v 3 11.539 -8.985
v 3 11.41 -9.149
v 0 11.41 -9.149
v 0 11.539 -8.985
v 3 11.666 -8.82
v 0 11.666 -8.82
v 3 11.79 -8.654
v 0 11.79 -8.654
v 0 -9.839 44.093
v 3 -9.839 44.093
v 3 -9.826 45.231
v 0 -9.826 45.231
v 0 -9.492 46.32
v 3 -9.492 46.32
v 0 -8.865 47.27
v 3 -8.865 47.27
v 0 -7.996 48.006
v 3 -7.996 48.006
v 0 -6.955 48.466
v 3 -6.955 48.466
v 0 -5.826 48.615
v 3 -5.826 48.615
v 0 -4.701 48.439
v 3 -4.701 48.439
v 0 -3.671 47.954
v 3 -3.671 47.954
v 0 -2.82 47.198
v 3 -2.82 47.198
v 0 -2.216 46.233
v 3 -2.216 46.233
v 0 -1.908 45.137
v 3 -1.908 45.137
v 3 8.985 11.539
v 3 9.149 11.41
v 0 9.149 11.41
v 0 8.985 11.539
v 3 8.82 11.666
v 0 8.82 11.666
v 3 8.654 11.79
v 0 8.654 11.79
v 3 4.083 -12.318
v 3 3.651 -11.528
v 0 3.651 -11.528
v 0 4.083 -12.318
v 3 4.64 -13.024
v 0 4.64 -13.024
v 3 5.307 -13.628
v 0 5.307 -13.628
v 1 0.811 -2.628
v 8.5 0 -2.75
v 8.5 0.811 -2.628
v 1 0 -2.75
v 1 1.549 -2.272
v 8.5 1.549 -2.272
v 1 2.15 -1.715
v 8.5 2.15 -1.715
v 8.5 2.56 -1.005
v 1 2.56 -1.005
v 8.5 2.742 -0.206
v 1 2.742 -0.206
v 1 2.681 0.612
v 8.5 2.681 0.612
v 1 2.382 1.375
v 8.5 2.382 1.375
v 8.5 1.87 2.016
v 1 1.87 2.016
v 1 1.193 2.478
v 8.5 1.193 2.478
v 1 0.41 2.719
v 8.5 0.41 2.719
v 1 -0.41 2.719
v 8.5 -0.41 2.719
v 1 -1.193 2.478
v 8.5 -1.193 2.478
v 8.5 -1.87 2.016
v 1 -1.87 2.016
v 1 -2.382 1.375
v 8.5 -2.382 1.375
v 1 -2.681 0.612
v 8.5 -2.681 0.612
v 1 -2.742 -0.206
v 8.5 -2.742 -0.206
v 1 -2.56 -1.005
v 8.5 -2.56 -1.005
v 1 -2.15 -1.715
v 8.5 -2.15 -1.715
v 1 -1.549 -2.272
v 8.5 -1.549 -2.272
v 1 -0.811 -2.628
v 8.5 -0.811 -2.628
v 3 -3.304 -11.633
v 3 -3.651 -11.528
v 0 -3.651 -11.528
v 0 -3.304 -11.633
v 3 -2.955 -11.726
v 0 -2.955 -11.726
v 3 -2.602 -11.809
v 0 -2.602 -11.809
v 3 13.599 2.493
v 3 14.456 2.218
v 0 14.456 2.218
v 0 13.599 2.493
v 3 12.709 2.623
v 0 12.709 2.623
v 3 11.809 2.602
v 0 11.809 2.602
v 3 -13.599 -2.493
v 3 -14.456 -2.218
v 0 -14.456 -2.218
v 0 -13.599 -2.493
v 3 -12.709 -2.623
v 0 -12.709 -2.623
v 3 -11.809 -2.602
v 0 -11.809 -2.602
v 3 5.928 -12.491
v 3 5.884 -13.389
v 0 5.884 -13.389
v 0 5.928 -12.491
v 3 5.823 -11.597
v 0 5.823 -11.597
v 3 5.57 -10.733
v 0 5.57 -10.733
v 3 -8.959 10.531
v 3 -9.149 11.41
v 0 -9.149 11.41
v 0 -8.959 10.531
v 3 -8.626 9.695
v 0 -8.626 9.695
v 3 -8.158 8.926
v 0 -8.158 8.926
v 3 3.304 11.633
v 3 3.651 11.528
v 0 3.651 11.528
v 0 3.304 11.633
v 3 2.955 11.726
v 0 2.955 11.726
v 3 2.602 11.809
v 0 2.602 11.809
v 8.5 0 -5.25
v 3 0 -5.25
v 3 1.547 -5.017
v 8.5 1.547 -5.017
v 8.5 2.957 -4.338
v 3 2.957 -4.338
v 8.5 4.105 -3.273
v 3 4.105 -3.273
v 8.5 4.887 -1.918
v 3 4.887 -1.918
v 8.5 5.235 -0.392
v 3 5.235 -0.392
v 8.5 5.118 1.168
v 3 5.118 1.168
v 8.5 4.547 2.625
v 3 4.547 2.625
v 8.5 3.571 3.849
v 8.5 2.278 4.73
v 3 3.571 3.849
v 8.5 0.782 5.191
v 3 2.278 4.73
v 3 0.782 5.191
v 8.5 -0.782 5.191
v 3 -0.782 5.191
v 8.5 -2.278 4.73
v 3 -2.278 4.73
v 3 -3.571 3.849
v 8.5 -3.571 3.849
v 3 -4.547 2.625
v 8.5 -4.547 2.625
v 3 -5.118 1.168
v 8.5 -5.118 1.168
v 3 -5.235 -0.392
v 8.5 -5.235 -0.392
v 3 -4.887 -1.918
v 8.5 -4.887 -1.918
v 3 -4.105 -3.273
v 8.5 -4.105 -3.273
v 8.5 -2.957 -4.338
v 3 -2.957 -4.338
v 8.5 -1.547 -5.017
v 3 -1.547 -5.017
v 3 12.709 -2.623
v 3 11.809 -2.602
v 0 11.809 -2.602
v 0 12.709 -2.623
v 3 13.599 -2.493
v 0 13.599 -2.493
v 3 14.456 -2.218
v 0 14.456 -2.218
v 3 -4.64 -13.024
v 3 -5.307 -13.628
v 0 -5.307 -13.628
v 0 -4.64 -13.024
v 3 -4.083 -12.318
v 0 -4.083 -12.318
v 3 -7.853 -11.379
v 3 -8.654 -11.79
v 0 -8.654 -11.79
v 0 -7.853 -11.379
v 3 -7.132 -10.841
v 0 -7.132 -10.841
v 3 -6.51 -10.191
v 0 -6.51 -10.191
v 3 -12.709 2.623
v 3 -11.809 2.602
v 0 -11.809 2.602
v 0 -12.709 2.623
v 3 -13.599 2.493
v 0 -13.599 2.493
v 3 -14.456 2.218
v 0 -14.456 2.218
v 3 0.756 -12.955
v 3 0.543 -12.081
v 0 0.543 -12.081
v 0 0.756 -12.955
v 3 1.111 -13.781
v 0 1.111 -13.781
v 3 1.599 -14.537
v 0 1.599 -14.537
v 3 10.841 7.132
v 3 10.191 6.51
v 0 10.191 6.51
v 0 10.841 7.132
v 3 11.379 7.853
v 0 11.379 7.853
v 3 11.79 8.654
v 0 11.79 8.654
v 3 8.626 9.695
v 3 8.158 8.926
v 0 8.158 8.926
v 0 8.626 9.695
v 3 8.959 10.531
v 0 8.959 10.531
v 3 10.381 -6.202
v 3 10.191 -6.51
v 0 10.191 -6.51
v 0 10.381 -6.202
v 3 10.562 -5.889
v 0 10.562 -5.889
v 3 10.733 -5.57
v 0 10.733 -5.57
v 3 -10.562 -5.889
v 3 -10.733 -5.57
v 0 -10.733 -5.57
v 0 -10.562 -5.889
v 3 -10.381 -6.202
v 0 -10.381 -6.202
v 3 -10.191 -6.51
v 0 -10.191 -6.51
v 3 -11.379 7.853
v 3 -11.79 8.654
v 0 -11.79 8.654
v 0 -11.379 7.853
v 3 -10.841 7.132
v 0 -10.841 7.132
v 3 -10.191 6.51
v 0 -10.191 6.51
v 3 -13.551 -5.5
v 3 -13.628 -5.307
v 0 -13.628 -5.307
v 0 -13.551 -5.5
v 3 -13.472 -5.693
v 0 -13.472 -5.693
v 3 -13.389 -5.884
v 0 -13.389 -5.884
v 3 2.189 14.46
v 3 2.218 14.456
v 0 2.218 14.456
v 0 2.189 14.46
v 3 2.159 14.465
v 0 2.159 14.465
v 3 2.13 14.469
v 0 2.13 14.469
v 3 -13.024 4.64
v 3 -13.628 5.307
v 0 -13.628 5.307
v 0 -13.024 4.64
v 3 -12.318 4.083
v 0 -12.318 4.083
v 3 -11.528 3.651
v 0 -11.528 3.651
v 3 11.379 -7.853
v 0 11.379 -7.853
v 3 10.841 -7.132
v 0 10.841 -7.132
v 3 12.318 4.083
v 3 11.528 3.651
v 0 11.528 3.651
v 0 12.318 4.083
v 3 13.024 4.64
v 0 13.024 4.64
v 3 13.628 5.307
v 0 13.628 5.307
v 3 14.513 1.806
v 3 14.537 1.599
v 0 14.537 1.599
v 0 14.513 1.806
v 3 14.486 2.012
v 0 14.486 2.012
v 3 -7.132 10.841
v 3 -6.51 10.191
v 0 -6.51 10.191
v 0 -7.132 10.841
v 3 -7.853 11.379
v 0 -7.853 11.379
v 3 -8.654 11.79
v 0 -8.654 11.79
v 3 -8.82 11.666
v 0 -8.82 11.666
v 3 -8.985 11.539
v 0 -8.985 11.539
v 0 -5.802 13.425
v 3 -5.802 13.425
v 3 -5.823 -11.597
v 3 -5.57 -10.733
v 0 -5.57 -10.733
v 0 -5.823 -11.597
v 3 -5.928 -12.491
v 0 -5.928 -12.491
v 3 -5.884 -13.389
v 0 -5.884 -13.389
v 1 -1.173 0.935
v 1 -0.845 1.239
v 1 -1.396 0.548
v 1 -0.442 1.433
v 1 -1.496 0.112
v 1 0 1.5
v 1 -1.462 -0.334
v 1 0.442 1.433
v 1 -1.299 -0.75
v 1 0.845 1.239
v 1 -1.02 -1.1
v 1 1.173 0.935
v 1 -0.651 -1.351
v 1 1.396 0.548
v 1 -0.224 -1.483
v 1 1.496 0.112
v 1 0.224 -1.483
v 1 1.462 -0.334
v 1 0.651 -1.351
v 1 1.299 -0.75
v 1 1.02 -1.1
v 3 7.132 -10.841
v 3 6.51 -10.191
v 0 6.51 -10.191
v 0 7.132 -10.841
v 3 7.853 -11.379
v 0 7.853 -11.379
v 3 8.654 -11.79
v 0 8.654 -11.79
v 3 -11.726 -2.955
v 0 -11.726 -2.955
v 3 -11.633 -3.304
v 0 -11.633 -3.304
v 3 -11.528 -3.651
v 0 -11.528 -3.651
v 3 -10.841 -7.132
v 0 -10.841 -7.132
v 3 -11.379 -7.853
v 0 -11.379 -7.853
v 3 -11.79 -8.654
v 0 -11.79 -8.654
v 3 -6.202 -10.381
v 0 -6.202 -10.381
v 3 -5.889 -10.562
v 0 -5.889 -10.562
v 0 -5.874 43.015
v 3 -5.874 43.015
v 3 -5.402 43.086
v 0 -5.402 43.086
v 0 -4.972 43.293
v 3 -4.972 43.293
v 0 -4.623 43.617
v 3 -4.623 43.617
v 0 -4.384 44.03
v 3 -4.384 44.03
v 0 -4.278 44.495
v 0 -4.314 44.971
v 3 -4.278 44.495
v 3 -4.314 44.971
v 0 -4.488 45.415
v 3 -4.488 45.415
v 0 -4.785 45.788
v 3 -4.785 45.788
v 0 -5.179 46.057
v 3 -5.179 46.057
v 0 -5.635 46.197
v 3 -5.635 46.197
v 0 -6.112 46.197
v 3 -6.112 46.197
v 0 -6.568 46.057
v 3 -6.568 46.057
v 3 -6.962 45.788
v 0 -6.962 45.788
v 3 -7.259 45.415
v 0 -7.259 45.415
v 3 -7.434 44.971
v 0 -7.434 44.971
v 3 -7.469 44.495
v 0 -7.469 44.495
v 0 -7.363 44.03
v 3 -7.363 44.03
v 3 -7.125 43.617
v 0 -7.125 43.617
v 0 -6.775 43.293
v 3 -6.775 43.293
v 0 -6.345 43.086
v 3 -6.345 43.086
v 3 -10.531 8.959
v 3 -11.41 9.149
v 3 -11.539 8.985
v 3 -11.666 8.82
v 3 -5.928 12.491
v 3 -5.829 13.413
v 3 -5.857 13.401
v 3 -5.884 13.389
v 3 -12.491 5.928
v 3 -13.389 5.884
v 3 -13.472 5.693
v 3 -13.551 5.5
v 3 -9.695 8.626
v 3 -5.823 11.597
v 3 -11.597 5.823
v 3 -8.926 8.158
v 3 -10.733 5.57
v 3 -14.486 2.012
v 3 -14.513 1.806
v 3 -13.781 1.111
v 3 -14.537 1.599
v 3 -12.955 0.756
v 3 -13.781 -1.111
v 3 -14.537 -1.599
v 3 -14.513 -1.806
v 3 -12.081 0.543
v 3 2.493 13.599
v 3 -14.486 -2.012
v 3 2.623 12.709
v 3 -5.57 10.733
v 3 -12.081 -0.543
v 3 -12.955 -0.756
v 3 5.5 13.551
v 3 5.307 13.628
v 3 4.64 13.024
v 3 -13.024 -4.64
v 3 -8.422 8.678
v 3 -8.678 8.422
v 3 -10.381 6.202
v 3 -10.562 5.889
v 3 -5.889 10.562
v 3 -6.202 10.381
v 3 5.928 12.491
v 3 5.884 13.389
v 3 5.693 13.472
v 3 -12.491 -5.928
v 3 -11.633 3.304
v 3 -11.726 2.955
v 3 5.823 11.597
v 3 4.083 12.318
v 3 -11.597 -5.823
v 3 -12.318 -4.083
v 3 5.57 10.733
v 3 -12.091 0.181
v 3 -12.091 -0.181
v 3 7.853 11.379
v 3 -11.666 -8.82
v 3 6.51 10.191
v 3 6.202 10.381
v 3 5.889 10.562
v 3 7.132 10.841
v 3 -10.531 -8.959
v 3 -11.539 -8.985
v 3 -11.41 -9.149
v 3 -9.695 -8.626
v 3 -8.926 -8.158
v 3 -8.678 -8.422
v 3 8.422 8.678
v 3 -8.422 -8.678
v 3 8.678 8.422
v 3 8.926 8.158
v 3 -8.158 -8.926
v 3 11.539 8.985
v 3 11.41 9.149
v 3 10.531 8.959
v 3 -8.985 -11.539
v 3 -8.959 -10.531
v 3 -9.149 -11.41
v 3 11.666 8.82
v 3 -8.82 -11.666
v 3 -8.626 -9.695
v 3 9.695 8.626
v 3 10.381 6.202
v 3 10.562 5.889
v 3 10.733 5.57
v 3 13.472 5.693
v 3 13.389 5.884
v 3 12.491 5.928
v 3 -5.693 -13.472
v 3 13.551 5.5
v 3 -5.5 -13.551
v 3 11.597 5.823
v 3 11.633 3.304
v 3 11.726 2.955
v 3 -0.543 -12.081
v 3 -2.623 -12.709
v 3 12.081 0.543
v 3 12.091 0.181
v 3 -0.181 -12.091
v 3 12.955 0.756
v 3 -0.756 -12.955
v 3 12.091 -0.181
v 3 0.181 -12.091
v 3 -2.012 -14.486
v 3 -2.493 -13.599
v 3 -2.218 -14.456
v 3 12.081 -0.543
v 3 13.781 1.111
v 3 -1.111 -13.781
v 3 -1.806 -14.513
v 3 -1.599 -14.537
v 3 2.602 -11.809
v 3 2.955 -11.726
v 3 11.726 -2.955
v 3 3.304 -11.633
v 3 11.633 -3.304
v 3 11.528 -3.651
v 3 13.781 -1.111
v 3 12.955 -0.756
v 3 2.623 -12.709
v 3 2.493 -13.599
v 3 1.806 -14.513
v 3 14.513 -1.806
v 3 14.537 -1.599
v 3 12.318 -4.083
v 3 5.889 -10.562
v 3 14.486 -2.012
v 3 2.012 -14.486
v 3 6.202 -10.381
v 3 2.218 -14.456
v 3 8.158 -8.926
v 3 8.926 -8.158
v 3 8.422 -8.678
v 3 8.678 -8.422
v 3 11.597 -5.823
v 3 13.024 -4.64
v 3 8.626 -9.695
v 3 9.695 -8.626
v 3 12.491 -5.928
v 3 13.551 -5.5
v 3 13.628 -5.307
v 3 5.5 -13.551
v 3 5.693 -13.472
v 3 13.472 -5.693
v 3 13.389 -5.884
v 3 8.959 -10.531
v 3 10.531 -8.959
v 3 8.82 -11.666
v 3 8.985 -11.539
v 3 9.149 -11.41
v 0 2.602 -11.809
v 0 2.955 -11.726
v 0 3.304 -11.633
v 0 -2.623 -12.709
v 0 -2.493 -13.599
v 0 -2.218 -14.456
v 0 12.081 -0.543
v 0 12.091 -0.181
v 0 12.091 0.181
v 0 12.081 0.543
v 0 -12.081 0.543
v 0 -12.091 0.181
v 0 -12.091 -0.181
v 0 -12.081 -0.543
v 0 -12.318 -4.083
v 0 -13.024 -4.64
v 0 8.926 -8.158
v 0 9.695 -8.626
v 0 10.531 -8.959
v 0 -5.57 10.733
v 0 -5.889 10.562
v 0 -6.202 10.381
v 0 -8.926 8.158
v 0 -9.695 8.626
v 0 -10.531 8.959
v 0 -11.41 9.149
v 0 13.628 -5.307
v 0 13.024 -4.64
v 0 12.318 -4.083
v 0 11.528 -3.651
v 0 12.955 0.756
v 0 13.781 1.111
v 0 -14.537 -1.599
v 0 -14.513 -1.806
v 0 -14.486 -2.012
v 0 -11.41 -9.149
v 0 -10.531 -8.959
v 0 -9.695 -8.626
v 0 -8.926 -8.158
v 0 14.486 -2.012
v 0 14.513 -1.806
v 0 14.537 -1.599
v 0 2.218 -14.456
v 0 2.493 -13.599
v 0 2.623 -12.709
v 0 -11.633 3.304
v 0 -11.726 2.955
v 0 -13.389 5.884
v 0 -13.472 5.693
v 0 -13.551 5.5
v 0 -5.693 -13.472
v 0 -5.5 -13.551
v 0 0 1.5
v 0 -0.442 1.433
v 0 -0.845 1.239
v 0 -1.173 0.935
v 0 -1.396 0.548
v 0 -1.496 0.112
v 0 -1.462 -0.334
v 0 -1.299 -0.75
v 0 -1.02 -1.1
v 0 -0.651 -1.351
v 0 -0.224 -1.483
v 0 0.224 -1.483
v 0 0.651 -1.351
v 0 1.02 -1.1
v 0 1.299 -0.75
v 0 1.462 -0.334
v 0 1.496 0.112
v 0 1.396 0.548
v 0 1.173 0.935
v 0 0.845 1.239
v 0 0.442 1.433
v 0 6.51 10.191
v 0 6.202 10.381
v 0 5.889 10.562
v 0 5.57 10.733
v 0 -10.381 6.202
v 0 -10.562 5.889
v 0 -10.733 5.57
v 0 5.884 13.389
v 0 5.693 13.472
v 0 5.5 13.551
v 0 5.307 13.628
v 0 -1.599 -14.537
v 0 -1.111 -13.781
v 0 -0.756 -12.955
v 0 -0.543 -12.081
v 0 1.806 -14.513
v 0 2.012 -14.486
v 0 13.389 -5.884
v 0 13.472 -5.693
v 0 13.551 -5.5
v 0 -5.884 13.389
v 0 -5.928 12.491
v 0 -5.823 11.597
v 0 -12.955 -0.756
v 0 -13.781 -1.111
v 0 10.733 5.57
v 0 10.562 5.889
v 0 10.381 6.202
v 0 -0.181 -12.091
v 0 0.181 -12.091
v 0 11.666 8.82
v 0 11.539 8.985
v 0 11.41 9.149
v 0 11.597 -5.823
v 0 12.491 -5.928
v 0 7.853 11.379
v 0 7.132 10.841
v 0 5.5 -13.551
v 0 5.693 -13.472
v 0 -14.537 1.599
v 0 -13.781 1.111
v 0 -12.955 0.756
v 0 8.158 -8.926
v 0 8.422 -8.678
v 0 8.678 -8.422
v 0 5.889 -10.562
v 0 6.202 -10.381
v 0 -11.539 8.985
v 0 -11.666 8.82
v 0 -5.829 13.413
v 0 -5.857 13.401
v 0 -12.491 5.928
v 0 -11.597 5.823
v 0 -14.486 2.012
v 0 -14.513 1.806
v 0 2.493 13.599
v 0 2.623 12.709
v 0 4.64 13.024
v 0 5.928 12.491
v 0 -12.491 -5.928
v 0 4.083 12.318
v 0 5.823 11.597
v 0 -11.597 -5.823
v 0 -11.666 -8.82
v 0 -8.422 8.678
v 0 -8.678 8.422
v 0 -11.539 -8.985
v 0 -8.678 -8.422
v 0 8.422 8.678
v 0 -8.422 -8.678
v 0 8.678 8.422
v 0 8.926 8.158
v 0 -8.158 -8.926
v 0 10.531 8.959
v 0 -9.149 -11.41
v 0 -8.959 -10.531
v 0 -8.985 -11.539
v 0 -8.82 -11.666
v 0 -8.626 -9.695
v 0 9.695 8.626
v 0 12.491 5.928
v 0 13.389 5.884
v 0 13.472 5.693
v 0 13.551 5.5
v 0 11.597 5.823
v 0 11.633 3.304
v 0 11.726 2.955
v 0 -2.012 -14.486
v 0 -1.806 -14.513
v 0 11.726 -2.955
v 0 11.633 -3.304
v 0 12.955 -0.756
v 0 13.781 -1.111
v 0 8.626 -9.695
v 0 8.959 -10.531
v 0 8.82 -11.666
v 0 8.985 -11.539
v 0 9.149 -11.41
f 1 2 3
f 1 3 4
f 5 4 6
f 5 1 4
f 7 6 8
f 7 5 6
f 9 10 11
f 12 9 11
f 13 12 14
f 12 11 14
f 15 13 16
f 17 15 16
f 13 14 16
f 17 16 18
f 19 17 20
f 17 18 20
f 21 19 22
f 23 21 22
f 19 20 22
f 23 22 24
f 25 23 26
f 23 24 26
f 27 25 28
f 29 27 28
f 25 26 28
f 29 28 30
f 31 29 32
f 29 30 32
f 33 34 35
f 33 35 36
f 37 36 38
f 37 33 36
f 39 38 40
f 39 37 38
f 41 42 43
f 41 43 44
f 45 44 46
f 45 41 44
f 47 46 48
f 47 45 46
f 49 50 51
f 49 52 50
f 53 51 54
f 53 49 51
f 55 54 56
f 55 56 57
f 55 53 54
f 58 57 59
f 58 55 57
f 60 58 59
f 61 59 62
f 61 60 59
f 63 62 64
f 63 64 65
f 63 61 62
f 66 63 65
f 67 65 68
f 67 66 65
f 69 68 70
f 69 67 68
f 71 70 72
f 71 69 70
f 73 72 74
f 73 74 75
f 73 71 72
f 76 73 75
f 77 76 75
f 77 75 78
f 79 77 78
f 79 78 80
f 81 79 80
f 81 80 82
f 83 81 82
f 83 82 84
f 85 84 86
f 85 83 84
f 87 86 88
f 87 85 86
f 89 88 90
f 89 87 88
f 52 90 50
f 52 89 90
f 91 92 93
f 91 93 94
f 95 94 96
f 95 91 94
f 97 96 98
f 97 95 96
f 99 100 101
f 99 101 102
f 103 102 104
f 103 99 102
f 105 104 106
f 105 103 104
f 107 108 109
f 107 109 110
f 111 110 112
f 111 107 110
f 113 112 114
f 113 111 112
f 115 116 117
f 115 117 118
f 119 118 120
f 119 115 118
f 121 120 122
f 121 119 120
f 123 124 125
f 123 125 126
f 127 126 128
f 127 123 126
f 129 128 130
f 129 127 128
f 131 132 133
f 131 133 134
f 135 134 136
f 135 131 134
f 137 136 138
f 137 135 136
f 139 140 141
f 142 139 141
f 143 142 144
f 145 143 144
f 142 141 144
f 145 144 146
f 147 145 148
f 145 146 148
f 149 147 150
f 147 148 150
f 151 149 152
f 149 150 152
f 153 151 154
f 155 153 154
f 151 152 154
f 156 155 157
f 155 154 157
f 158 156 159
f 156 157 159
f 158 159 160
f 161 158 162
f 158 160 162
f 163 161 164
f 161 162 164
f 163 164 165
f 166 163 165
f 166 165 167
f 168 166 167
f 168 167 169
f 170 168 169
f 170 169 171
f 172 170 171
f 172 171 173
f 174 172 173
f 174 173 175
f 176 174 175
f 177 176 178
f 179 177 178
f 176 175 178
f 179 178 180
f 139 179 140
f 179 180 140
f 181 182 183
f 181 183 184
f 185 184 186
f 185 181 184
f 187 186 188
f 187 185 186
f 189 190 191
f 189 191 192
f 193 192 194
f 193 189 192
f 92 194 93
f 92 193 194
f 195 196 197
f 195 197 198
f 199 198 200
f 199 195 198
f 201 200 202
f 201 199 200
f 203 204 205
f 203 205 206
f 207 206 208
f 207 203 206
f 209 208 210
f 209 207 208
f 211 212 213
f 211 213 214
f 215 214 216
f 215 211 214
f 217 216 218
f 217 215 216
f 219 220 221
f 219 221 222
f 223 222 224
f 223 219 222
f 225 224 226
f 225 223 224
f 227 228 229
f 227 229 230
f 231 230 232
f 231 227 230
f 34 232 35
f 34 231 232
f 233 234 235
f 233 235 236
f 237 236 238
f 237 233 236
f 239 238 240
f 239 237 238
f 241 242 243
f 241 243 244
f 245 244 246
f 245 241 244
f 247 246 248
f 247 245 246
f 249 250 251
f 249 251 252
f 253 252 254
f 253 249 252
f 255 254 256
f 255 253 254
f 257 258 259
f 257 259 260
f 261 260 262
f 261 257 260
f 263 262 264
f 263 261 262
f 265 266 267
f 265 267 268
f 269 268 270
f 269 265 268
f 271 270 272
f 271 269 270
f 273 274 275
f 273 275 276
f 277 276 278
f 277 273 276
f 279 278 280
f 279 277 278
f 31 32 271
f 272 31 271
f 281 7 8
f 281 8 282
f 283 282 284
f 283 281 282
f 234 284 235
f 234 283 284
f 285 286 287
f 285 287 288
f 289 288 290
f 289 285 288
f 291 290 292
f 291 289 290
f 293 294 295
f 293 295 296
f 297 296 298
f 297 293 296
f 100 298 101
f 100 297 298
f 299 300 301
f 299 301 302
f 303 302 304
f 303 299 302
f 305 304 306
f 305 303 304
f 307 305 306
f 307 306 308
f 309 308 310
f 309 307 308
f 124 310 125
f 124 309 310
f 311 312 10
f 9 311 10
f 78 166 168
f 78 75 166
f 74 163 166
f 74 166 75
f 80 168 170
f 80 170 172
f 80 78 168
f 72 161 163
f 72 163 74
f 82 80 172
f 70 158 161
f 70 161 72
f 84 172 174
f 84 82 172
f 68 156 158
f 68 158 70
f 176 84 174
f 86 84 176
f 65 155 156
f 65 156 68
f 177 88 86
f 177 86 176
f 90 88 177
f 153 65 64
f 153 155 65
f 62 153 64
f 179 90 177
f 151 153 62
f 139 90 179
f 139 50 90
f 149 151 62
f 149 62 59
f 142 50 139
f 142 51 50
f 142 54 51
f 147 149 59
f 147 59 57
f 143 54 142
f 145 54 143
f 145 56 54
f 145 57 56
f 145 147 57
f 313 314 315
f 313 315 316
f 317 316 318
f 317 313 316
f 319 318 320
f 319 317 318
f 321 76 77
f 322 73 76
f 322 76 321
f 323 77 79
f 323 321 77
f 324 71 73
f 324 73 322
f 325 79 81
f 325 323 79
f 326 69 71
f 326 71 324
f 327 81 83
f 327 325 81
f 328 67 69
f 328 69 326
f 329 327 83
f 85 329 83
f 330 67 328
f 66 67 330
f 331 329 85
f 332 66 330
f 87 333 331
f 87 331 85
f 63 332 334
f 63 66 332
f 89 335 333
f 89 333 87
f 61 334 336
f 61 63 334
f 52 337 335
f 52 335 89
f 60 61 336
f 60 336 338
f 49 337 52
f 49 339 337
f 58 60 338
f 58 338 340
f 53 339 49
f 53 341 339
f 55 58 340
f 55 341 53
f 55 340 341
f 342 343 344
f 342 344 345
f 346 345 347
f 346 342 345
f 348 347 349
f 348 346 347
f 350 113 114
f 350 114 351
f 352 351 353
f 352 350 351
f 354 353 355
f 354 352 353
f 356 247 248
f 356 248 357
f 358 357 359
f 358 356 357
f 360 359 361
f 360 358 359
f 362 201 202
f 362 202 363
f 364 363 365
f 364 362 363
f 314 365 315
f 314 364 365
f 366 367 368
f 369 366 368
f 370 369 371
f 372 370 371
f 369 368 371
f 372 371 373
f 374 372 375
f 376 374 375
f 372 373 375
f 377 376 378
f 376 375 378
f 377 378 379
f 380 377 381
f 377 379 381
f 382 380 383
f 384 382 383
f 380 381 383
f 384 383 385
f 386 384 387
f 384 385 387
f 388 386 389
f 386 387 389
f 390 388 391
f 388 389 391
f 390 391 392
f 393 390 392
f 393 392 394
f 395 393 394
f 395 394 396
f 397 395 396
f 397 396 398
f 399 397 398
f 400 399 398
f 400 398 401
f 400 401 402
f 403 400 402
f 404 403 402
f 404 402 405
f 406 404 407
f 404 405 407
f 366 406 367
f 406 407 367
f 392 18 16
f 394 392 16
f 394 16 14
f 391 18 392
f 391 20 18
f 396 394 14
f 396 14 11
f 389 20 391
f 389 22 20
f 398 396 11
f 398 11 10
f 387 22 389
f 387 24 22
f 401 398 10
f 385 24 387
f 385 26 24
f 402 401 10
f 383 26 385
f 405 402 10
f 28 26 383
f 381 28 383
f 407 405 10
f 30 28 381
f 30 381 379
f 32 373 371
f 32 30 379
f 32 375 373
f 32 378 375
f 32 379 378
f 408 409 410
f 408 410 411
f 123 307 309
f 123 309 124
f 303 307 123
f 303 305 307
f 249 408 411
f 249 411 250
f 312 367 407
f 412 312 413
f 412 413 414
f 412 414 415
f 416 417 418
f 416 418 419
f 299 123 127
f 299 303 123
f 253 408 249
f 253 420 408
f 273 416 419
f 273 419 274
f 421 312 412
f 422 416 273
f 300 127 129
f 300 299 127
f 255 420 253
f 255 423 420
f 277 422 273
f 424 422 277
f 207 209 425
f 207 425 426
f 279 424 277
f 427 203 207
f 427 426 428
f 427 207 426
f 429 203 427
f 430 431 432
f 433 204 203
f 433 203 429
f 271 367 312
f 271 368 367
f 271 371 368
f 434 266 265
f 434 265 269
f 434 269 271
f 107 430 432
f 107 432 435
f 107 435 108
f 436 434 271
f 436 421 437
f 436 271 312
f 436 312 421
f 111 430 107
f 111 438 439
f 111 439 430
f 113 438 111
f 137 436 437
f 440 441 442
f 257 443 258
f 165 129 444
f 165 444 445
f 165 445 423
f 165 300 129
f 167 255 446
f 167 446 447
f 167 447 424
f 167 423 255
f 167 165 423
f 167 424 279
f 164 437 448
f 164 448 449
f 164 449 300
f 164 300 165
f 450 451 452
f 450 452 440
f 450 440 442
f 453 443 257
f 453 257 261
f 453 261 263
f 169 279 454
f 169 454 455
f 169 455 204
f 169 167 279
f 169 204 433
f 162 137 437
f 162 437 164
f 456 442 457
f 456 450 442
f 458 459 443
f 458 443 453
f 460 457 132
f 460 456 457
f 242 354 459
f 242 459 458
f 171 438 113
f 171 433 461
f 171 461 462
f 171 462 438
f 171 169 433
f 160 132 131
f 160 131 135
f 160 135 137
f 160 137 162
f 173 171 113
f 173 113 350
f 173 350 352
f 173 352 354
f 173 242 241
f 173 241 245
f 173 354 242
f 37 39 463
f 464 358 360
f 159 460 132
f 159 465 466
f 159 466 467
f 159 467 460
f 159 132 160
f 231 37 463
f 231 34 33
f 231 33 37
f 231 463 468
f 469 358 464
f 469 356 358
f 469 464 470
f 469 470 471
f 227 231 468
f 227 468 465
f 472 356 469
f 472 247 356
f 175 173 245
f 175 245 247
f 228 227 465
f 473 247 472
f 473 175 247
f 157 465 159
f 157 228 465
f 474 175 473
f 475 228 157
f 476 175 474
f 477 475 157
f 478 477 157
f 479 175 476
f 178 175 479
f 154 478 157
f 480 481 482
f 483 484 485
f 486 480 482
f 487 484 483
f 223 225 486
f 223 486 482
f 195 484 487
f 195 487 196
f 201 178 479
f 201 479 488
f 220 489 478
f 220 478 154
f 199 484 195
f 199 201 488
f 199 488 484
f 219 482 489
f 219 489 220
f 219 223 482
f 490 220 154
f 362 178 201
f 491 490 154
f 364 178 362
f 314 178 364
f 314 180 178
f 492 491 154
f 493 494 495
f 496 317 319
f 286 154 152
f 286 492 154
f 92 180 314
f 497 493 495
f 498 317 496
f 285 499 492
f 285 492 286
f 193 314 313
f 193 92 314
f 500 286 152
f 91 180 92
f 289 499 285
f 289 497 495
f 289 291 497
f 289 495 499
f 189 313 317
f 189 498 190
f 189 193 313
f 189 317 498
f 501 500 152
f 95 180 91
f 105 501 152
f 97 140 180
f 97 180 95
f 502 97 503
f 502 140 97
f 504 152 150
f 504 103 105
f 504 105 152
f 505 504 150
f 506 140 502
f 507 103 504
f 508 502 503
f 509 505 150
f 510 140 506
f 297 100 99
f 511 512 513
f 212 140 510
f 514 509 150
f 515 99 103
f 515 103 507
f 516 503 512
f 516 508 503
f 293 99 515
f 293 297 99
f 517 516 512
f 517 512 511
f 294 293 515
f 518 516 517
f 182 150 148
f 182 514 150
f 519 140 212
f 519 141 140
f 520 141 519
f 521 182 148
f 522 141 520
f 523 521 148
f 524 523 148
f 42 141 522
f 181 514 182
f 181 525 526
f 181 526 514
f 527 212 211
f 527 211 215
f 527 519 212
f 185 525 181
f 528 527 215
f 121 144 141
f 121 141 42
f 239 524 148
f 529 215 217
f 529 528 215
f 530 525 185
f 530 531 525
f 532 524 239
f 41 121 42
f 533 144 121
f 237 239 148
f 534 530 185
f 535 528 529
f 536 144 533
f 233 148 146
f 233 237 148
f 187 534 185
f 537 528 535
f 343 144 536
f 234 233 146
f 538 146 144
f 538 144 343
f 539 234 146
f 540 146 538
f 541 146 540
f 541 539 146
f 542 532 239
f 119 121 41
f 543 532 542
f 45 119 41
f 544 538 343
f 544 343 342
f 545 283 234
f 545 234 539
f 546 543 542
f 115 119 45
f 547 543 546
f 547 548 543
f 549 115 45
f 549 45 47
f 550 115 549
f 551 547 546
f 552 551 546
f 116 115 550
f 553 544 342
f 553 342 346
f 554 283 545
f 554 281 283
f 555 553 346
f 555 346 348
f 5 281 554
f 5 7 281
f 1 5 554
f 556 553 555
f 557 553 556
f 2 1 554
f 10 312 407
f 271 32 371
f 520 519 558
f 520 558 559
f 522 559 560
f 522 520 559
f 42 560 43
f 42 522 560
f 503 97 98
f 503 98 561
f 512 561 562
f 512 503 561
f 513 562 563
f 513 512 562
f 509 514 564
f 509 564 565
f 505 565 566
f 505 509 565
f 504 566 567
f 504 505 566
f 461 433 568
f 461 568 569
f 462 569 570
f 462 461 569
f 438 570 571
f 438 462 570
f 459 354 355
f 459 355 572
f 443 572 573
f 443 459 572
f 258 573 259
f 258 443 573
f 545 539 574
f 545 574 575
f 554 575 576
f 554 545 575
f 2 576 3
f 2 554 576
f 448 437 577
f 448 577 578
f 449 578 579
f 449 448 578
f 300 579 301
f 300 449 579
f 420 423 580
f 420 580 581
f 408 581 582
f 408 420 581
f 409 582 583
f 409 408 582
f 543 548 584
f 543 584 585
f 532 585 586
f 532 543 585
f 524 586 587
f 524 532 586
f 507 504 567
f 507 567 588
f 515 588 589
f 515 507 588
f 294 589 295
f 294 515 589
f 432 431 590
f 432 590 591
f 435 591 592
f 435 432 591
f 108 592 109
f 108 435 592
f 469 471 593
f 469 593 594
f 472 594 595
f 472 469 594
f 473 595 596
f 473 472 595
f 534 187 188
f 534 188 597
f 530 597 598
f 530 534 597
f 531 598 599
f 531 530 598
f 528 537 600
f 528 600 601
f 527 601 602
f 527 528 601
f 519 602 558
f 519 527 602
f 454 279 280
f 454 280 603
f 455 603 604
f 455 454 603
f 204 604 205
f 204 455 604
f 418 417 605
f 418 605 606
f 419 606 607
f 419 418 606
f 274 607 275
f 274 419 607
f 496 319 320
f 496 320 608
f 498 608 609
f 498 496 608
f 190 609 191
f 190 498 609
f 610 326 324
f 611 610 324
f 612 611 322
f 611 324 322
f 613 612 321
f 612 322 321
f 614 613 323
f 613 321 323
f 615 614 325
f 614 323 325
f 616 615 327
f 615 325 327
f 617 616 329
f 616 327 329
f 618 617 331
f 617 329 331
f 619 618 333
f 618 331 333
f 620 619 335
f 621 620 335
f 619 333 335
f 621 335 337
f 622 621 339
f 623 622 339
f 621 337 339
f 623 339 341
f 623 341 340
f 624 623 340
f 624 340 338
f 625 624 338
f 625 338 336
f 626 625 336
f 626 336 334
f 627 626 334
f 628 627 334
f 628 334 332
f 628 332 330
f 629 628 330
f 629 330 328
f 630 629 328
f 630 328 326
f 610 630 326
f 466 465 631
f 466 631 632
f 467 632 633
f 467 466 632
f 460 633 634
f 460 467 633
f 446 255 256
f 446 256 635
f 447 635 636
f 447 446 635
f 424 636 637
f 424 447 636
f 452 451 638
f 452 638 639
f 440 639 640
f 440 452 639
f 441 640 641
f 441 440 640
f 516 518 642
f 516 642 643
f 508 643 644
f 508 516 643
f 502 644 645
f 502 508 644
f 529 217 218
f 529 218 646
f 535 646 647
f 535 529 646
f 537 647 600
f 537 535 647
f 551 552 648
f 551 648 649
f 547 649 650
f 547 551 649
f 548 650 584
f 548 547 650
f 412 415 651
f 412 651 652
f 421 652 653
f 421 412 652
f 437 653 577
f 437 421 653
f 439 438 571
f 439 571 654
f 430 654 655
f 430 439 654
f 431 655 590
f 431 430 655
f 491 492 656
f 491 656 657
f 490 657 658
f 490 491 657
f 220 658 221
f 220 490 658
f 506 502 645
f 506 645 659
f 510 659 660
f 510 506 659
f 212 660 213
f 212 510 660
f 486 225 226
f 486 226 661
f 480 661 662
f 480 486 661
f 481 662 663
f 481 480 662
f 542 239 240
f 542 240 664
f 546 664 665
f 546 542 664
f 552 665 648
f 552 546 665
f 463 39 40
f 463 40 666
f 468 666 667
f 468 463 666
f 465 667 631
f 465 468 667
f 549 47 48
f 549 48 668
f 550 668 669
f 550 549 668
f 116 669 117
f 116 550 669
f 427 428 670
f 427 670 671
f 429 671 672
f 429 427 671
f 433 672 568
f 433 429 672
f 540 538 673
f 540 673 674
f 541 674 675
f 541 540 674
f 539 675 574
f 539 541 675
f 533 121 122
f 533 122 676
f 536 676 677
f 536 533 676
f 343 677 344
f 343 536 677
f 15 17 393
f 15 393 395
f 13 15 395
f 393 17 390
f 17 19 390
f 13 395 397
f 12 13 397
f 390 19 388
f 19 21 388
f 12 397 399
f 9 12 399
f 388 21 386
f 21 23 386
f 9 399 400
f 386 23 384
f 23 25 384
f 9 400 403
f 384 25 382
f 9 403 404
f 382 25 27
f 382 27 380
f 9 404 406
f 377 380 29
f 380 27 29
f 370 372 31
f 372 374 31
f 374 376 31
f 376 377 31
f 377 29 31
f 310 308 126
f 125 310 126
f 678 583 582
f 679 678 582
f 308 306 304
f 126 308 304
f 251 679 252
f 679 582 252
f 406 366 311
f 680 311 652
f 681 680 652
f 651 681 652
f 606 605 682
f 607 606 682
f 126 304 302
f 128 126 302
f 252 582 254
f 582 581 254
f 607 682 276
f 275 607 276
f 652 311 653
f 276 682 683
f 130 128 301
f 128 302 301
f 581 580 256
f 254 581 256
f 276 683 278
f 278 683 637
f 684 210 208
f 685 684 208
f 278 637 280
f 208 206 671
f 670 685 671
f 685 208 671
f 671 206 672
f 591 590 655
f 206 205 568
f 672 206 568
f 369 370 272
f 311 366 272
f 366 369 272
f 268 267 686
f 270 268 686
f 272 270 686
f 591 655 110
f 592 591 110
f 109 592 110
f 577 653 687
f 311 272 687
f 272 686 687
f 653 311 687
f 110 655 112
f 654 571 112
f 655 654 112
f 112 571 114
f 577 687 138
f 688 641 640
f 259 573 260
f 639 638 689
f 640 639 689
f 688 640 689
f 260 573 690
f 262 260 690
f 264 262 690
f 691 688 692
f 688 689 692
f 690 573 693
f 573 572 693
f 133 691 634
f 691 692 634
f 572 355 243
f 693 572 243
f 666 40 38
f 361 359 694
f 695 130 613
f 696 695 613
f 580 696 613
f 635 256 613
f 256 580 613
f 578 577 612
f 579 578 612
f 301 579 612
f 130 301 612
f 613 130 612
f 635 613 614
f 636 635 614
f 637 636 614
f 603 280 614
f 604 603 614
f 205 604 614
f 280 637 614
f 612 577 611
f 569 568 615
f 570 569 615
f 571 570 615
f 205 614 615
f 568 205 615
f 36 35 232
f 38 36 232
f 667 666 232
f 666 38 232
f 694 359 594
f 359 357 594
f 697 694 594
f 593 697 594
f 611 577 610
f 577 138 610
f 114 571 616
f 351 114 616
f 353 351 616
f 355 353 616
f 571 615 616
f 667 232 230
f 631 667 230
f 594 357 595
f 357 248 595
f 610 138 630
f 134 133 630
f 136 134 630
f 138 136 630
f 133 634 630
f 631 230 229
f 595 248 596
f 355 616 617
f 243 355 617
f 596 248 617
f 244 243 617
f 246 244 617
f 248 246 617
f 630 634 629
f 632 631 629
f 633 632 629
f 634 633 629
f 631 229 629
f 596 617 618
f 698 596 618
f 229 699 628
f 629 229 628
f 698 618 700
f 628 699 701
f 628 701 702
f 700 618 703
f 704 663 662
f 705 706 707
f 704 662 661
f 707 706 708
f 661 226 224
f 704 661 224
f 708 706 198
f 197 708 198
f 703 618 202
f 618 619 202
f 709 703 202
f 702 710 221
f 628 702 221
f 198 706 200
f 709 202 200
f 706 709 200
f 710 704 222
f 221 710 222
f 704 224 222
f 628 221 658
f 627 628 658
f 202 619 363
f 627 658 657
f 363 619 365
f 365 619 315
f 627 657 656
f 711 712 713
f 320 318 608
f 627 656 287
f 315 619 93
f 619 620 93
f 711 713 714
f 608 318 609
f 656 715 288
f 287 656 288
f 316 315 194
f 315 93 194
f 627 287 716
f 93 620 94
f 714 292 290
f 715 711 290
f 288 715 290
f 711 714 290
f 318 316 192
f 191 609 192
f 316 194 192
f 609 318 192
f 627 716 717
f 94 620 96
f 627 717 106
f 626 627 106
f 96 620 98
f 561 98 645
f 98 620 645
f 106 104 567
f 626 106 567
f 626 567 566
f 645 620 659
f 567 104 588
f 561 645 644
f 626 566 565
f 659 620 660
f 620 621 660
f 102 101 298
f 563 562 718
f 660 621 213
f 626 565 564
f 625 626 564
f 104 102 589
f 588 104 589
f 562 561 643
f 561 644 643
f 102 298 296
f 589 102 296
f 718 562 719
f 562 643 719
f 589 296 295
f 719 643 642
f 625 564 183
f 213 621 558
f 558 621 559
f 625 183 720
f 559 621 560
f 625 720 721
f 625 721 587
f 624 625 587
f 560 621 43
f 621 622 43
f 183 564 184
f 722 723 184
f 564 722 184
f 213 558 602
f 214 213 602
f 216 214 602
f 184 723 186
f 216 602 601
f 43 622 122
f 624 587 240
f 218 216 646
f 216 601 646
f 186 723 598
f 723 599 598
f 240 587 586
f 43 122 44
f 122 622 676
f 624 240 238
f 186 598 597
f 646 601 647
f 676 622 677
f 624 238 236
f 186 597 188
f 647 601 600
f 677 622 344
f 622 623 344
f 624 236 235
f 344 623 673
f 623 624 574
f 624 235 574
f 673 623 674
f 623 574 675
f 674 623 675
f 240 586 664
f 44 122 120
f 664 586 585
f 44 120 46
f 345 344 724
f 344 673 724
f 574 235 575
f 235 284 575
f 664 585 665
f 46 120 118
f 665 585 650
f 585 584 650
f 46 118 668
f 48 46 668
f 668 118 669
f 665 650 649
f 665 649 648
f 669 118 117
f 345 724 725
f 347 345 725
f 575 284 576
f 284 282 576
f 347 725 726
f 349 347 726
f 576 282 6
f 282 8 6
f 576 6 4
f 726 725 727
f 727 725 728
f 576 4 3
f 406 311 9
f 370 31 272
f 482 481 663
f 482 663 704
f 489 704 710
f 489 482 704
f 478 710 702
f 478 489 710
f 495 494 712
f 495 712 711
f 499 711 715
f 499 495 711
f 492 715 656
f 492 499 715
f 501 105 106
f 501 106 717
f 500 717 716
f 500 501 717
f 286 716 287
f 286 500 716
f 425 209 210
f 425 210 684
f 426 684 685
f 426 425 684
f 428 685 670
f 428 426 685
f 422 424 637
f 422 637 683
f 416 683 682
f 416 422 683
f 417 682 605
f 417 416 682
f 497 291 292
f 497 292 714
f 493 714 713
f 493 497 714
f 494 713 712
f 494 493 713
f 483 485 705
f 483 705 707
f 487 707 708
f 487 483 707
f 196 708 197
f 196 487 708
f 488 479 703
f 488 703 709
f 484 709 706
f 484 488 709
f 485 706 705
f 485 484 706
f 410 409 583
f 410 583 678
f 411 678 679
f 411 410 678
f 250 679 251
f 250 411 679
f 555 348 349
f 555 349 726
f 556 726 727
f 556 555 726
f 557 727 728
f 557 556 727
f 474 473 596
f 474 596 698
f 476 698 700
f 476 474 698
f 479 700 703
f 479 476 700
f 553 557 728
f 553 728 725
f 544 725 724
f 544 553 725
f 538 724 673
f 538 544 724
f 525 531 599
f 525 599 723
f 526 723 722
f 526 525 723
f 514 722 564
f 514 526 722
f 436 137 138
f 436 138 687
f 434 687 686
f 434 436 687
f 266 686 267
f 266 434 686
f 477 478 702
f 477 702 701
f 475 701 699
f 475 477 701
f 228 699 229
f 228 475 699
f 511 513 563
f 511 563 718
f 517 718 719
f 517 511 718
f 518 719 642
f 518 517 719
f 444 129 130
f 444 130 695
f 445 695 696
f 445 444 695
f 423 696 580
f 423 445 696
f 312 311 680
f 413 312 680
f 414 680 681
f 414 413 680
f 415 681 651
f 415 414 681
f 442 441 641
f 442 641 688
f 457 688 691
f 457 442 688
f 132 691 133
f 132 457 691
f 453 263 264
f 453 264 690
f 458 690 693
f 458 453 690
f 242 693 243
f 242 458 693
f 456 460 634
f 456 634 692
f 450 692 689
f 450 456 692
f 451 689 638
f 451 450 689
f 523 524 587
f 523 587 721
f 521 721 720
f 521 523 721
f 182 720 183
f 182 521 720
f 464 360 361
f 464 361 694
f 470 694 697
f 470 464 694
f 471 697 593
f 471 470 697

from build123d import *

# Parameters (mm, degrees)
SKETCH1_R           = 1.5
BOSS_EXTRUDE1_DEPTH = 3
SKETCH2_R           = 1.6
SKETCH2_R_2         = 1.5
BOSS_EXTRUDE2_DEPTH = 3
SKETCH3_R           = 5.25
SKETCH3_R_2         = 2.75
BOSS_EXTRUDE3_DEPTH = 5.5
CUT_EXTRUDE1_START  = -2
SKETCH4_R           = 2.75
CUT_EXTRUDE1_DEPTH  = 2


with BuildPart() as part:
    # Sketch1 → Boss-Extrude1 (new body)
    with BuildSketch(Plane(origin=(3, 0, 0), x_dir=(0, 0, -1), z_dir=(1, 0, 0))):
        with BuildLine():
            ThreePointArc((-14.537314892, 1.599093719), (-13.375367565, 0.916420874), (-12.080565177, 0.542722358))
            ThreePointArc((-12.080565177, 0.542722358), (-12.09275, 0), (-12.080565177, -0.542722358))
            ThreePointArc((-12.080565177, -0.542722358), (-13.375367565, -0.916420874), (-14.537314892, -1.599093719))
            ThreePointArc((-14.537314892, -1.599093719), (-14.499881098, -1.908945561), (-14.455843809, -2.217928037))
            ThreePointArc((-14.455843809, -2.217928037), (-13.156800143, -2.576605271), (-11.809396783, -2.602450802))
            ThreePointArc((-11.809396783, -2.602450802), (-11.680699536, -3.129834008), (-11.528463019, -3.650909885))
            ThreePointArc((-11.528463019, -3.650909885), (-12.682425791, -4.346994451), (-13.62809199, -5.30713988))
            ThreePointArc((-13.62809199, -5.30713988), (-13.511738163, -5.596745198), (-13.389230859, -5.883801663))
            ThreePointArc((-13.389230859, -5.883801663), (-12.041618533, -5.894040025), (-10.733437515, -5.57027124))
            ThreePointArc((-10.733437515, -5.57027124), (-10.472628702, -6.046375), (-10.190715157, -6.510293938))
            ThreePointArc((-10.190715157, -6.510293938), (-11.125197659, -7.48132754), (-11.79013714, -8.65351323))
            ThreePointArc((-11.79013714, -8.65351323), (-11.602792602, -8.903135899), (-11.410163953, -9.148703928))
            ThreePointArc((-11.410163953, -9.148703928), (-10.105820521, -8.809805691), (-8.926012217, -8.158486898))
            ThreePointArc((-8.926012217, -8.158486898), (-8.550865528, -8.550865528), (-8.158486898, -8.926012217))
            ThreePointArc((-8.158486898, -8.926012217), (-8.809805691, -10.105820521), (-9.148703928, -11.410163953))
            ThreePointArc((-9.148703928, -11.410163953), (-8.903135899, -11.602792602), (-8.65351323, -11.79013714))
            ThreePointArc((-8.65351323, -11.79013714), (-7.48132754, -11.125197659), (-6.510293938, -10.190715157))
            ThreePointArc((-6.510293938, -10.190715157), (-6.046375, -10.472628702), (-5.57027124, -10.733437515))
            ThreePointArc((-5.57027124, -10.733437515), (-5.894040025, -12.041618533), (-5.883801663, -13.389230859))
            ThreePointArc((-5.883801663, -13.389230859), (-5.596745198, -13.511738163), (-5.30713988, -13.62809199))
            ThreePointArc((-5.30713988, -13.62809199), (-4.346994451, -12.682425791), (-3.650909885, -11.528463019))
            ThreePointArc((-3.650909885, -11.528463019), (-3.129834008, -11.680699536), (-2.602450802, -11.809396783))
            ThreePointArc((-2.602450802, -11.809396783), (-2.576605271, -13.156800143), (-2.217928037, -14.455843809))
            ThreePointArc((-2.217928037, -14.455843809), (-1.908945561, -14.499881098), (-1.599093719, -14.537314892))
            ThreePointArc((-1.599093719, -14.537314892), (-0.916420874, -13.375367565), (-0.542722358, -12.080565177))
            ThreePointArc((-0.542722358, -12.080565177), (0, -12.09275), (0.542722358, -12.080565177))
            ThreePointArc((0.542722358, -12.080565177), (0.916420874, -13.375367565), (1.599093719, -14.537314892))
            ThreePointArc((1.599093719, -14.537314892), (1.908945561, -14.499881098), (2.217928037, -14.455843809))
            ThreePointArc((2.217928037, -14.455843809), (2.576605271, -13.156800143), (2.602450802, -11.809396783))
            ThreePointArc((2.602450802, -11.809396783), (3.129834008, -11.680699536), (3.650909885, -11.528463019))
            ThreePointArc((3.650909885, -11.528463019), (4.346994451, -12.682425791), (5.30713988, -13.62809199))
            ThreePointArc((5.30713988, -13.62809199), (5.596745198, -13.511738163), (5.883801663, -13.389230859))
            ThreePointArc((5.883801663, -13.389230859), (5.894040025, -12.041618533), (5.57027124, -10.733437515))
            ThreePointArc((5.57027124, -10.733437515), (6.046375, -10.472628702), (6.510293938, -10.190715157))
            ThreePointArc((6.510293938, -10.190715157), (7.48132754, -11.125197659), (8.65351323, -11.79013714))
            ThreePointArc((8.65351323, -11.79013714), (8.903135899, -11.602792602), (9.148703928, -11.410163953))
            ThreePointArc((9.148703928, -11.410163953), (8.809805691, -10.105820521), (8.158486898, -8.926012217))
            ThreePointArc((8.158486898, -8.926012217), (8.550865528, -8.550865528), (8.926012217, -8.158486898))
            ThreePointArc((8.926012217, -8.158486898), (10.105820521, -8.809805691), (11.410163953, -9.148703928))
            ThreePointArc((11.410163953, -9.148703928), (11.602792602, -8.903135899), (11.79013714, -8.65351323))
            ThreePointArc((11.79013714, -8.65351323), (11.125197659, -7.48132754), (10.190715157, -6.510293938))
            ThreePointArc((10.190715157, -6.510293938), (10.472628702, -6.046375), (10.733437515, -5.57027124))
            ThreePointArc((10.733437515, -5.57027124), (12.041618533, -5.894040025), (13.389230859, -5.883801663))
            ThreePointArc((13.389230859, -5.883801663), (13.511738163, -5.596745198), (13.62809199, -5.30713988))
            ThreePointArc((13.62809199, -5.30713988), (12.682425791, -4.346994451), (11.528463019, -3.650909885))
            ThreePointArc((11.528463019, -3.650909885), (11.680699536, -3.129834008), (11.809396783, -2.602450802))
            ThreePointArc((11.809396783, -2.602450802), (13.156800143, -2.576605271), (14.455843809, -2.217928037))
            ThreePointArc((14.455843809, -2.217928037), (14.499881098, -1.908945561), (14.537314892, -1.599093719))
            ThreePointArc((14.537314892, -1.599093719), (13.375367565, -0.916420874), (12.080565177, -0.542722358))
            ThreePointArc((12.080565177, -0.542722358), (12.09275, 0), (12.080565177, 0.542722358))
            ThreePointArc((12.080565177, 0.542722358), (13.375367565, 0.916420874), (14.537314892, 1.599093719))
            ThreePointArc((14.537314892, 1.599093719), (14.499881098, 1.908945561), (14.455843809, 2.217928037))
            ThreePointArc((14.455843809, 2.217928037), (13.156800143, 2.576605271), (11.809396783, 2.602450802))
            ThreePointArc((11.809396783, 2.602450802), (11.680699536, 3.129834008), (11.528463019, 3.650909885))
            ThreePointArc((11.528463019, 3.650909885), (12.682425791, 4.346994451), (13.62809199, 5.30713988))
            ThreePointArc((13.62809199, 5.30713988), (13.511738163, 5.596745198), (13.389230859, 5.883801663))
            ThreePointArc((13.389230859, 5.883801663), (12.041618533, 5.894040025), (10.733437515, 5.57027124))
            ThreePointArc((10.733437515, 5.57027124), (10.472628702, 6.046375), (10.190715157, 6.510293938))
            ThreePointArc((10.190715157, 6.510293938), (11.125197659, 7.48132754), (11.79013714, 8.65351323))
            ThreePointArc((11.79013714, 8.65351323), (11.602792602, 8.903135899), (11.410163953, 9.148703928))
            ThreePointArc((11.410163953, 9.148703928), (10.105820521, 8.809805691), (8.926012217, 8.158486898))
            ThreePointArc((8.926012217, 8.158486898), (8.550865528, 8.550865528), (8.158486898, 8.926012217))
            ThreePointArc((8.158486898, 8.926012217), (8.809805691, 10.105820521), (9.148703928, 11.410163953))
            ThreePointArc((9.148703928, 11.410163953), (8.903135899, 11.602792602), (8.65351323, 11.79013714))
            ThreePointArc((8.65351323, 11.79013714), (7.48132754, 11.125197659), (6.510293938, 10.190715157))
            ThreePointArc((6.510293938, 10.190715157), (6.046375, 10.472628702), (5.57027124, 10.733437515))
            ThreePointArc((5.57027124, 10.733437515), (5.894040025, 12.041618533), (5.883801663, 13.389230859))
            ThreePointArc((5.883801663, 13.389230859), (5.596745198, 13.511738163), (5.30713988, 13.62809199))
            ThreePointArc((5.30713988, 13.62809199), (4.346994451, 12.682425791), (3.650909885, 11.528463019))
            ThreePointArc((3.650909885, 11.528463019), (3.129834008, 11.680699536), (2.602450802, 11.809396783))
            ThreePointArc((2.602450802, 11.809396783), (2.576605271, 13.156800143), (2.217928037, 14.455843809))
            ThreePointArc((2.217928037, 14.455843809), (1.908945561, 14.499881098), (1.599093719, 14.537314892))
            ThreePointArc((1.599093719, 14.537314892), (0.916420874, 13.375367565), (0.542722358, 12.080565177))
            ThreePointArc((0.542722358, 12.080565177), (0, 12.09275), (-0.542722358, 12.080565177))
            ThreePointArc((-0.542722358, 12.080565177), (-0.916420874, 13.375367565), (-1.599093719, 14.537314892))
            ThreePointArc((-1.599093719, 14.537314892), (-1.908945561, 14.499881098), (-2.217928037, 14.455843809))
            ThreePointArc((-2.217928037, 14.455843809), (-2.576605271, 13.156800143), (-2.602450802, 11.809396783))
            ThreePointArc((-2.602450802, 11.809396783), (-3.129834008, 11.680699536), (-3.650909885, 11.528463019))
            ThreePointArc((-3.650909885, 11.528463019), (-4.346994451, 12.682425791), (-5.30713988, 13.62809199))
            ThreePointArc((-5.30713988, 13.62809199), (-5.596745198, 13.511738163), (-5.883801663, 13.389230859))
            ThreePointArc((-5.883801663, 13.389230859), (-5.894040025, 12.041618533), (-5.57027124, 10.733437515))
            ThreePointArc((-5.57027124, 10.733437515), (-6.046375, 10.472628702), (-6.510293938, 10.190715157))
            ThreePointArc((-6.510293938, 10.190715157), (-7.48132754, 11.125197659), (-8.65351323, 11.79013714))
            ThreePointArc((-8.65351323, 11.79013714), (-8.903135899, 11.602792602), (-9.148703928, 11.410163953))
            ThreePointArc((-9.148703928, 11.410163953), (-8.809805691, 10.105820521), (-8.158486898, 8.926012217))
            ThreePointArc((-8.158486898, 8.926012217), (-8.550865528, 8.550865528), (-8.926012217, 8.158486898))
            ThreePointArc((-8.926012217, 8.158486898), (-10.105820521, 8.809805691), (-11.410163953, 9.148703928))
            ThreePointArc((-11.410163953, 9.148703928), (-11.602792602, 8.903135899), (-11.79013714, 8.65351323))
            ThreePointArc((-11.79013714, 8.65351323), (-11.125197659, 7.48132754), (-10.190715157, 6.510293938))
            ThreePointArc((-10.190715157, 6.510293938), (-10.472628702, 6.046375), (-10.733437515, 5.57027124))
            ThreePointArc((-10.733437515, 5.57027124), (-12.041618533, 5.894040025), (-13.389230859, 5.883801663))
            ThreePointArc((-13.389230859, 5.883801663), (-13.511738163, 5.596745198), (-13.62809199, 5.30713988))
            ThreePointArc((-13.62809199, 5.30713988), (-12.682425791, 4.346994451), (-11.528463019, 3.650909885))
            ThreePointArc((-11.528463019, 3.650909885), (-11.680699536, 3.129834008), (-11.809396783, 2.602450802))
            ThreePointArc((-11.809396783, 2.602450802), (-13.156800143, 2.576605271), (-14.455843809, 2.217928037))
            ThreePointArc((-14.455843809, 2.217928037), (-14.499881098, 1.908945561), (-14.537314892, 1.599093719))
        make_face()
        with Locations(Location((0, 0, 0), (0, 0, 180))):
            Circle(SKETCH1_R, mode=Mode.SUBTRACT)
    extrude(amount=-BOSS_EXTRUDE1_DEPTH)

    # Sketch2 → Boss-Extrude2 (add)
    with BuildSketch(Plane(origin=(3, 0, 0), x_dir=(0, 0, -1), z_dir=(1, 0, 0))):
        with BuildLine():
            Line((0.522104769, -3.965779445), (-44.092913993, -9.839458095))
            ThreePointArc((-44.092913993, -9.839458095), (-48.580798207, -6.395783419), (-45.137123531, -1.907899204))
            Line((-45.137123531, -1.907899204), (-0.522104769, 3.965779445))
            ThreePointArc((-0.522104769, 3.965779445), (3.965779445, 0.522104769), (0.522104769, -3.965779445))
        make_face()
        with Locations((-44.615018762, -5.87367865)):
            Circle(SKETCH2_R, mode=Mode.SUBTRACT)
        with Locations(Location((0, 0, 0), (0, 0, 180))):
            Circle(SKETCH2_R_2, mode=Mode.SUBTRACT)
    extrude(amount=-BOSS_EXTRUDE2_DEPTH)

    # Sketch3 → Boss-Extrude3 (add)
    with BuildSketch(Plane(origin=(3, 0, 0), x_dir=(0, 0, -1), z_dir=(1, 0, 0))):
        Circle(SKETCH3_R)
        Circle(SKETCH3_R_2, mode=Mode.SUBTRACT)
    extrude(amount=BOSS_EXTRUDE3_DEPTH)

    # Sketch4 → Cut-Extrude1 (cut)
    with BuildSketch(Plane(origin=(3, 0, 0), x_dir=(0, 0, -1), z_dir=(1, 0, 0)).offset(CUT_EXTRUDE1_START)):
        Circle(SKETCH4_R)
    extrude(amount=CUT_EXTRUDE1_DEPTH, mode=Mode.SUBTRACT)


solid = part.part
